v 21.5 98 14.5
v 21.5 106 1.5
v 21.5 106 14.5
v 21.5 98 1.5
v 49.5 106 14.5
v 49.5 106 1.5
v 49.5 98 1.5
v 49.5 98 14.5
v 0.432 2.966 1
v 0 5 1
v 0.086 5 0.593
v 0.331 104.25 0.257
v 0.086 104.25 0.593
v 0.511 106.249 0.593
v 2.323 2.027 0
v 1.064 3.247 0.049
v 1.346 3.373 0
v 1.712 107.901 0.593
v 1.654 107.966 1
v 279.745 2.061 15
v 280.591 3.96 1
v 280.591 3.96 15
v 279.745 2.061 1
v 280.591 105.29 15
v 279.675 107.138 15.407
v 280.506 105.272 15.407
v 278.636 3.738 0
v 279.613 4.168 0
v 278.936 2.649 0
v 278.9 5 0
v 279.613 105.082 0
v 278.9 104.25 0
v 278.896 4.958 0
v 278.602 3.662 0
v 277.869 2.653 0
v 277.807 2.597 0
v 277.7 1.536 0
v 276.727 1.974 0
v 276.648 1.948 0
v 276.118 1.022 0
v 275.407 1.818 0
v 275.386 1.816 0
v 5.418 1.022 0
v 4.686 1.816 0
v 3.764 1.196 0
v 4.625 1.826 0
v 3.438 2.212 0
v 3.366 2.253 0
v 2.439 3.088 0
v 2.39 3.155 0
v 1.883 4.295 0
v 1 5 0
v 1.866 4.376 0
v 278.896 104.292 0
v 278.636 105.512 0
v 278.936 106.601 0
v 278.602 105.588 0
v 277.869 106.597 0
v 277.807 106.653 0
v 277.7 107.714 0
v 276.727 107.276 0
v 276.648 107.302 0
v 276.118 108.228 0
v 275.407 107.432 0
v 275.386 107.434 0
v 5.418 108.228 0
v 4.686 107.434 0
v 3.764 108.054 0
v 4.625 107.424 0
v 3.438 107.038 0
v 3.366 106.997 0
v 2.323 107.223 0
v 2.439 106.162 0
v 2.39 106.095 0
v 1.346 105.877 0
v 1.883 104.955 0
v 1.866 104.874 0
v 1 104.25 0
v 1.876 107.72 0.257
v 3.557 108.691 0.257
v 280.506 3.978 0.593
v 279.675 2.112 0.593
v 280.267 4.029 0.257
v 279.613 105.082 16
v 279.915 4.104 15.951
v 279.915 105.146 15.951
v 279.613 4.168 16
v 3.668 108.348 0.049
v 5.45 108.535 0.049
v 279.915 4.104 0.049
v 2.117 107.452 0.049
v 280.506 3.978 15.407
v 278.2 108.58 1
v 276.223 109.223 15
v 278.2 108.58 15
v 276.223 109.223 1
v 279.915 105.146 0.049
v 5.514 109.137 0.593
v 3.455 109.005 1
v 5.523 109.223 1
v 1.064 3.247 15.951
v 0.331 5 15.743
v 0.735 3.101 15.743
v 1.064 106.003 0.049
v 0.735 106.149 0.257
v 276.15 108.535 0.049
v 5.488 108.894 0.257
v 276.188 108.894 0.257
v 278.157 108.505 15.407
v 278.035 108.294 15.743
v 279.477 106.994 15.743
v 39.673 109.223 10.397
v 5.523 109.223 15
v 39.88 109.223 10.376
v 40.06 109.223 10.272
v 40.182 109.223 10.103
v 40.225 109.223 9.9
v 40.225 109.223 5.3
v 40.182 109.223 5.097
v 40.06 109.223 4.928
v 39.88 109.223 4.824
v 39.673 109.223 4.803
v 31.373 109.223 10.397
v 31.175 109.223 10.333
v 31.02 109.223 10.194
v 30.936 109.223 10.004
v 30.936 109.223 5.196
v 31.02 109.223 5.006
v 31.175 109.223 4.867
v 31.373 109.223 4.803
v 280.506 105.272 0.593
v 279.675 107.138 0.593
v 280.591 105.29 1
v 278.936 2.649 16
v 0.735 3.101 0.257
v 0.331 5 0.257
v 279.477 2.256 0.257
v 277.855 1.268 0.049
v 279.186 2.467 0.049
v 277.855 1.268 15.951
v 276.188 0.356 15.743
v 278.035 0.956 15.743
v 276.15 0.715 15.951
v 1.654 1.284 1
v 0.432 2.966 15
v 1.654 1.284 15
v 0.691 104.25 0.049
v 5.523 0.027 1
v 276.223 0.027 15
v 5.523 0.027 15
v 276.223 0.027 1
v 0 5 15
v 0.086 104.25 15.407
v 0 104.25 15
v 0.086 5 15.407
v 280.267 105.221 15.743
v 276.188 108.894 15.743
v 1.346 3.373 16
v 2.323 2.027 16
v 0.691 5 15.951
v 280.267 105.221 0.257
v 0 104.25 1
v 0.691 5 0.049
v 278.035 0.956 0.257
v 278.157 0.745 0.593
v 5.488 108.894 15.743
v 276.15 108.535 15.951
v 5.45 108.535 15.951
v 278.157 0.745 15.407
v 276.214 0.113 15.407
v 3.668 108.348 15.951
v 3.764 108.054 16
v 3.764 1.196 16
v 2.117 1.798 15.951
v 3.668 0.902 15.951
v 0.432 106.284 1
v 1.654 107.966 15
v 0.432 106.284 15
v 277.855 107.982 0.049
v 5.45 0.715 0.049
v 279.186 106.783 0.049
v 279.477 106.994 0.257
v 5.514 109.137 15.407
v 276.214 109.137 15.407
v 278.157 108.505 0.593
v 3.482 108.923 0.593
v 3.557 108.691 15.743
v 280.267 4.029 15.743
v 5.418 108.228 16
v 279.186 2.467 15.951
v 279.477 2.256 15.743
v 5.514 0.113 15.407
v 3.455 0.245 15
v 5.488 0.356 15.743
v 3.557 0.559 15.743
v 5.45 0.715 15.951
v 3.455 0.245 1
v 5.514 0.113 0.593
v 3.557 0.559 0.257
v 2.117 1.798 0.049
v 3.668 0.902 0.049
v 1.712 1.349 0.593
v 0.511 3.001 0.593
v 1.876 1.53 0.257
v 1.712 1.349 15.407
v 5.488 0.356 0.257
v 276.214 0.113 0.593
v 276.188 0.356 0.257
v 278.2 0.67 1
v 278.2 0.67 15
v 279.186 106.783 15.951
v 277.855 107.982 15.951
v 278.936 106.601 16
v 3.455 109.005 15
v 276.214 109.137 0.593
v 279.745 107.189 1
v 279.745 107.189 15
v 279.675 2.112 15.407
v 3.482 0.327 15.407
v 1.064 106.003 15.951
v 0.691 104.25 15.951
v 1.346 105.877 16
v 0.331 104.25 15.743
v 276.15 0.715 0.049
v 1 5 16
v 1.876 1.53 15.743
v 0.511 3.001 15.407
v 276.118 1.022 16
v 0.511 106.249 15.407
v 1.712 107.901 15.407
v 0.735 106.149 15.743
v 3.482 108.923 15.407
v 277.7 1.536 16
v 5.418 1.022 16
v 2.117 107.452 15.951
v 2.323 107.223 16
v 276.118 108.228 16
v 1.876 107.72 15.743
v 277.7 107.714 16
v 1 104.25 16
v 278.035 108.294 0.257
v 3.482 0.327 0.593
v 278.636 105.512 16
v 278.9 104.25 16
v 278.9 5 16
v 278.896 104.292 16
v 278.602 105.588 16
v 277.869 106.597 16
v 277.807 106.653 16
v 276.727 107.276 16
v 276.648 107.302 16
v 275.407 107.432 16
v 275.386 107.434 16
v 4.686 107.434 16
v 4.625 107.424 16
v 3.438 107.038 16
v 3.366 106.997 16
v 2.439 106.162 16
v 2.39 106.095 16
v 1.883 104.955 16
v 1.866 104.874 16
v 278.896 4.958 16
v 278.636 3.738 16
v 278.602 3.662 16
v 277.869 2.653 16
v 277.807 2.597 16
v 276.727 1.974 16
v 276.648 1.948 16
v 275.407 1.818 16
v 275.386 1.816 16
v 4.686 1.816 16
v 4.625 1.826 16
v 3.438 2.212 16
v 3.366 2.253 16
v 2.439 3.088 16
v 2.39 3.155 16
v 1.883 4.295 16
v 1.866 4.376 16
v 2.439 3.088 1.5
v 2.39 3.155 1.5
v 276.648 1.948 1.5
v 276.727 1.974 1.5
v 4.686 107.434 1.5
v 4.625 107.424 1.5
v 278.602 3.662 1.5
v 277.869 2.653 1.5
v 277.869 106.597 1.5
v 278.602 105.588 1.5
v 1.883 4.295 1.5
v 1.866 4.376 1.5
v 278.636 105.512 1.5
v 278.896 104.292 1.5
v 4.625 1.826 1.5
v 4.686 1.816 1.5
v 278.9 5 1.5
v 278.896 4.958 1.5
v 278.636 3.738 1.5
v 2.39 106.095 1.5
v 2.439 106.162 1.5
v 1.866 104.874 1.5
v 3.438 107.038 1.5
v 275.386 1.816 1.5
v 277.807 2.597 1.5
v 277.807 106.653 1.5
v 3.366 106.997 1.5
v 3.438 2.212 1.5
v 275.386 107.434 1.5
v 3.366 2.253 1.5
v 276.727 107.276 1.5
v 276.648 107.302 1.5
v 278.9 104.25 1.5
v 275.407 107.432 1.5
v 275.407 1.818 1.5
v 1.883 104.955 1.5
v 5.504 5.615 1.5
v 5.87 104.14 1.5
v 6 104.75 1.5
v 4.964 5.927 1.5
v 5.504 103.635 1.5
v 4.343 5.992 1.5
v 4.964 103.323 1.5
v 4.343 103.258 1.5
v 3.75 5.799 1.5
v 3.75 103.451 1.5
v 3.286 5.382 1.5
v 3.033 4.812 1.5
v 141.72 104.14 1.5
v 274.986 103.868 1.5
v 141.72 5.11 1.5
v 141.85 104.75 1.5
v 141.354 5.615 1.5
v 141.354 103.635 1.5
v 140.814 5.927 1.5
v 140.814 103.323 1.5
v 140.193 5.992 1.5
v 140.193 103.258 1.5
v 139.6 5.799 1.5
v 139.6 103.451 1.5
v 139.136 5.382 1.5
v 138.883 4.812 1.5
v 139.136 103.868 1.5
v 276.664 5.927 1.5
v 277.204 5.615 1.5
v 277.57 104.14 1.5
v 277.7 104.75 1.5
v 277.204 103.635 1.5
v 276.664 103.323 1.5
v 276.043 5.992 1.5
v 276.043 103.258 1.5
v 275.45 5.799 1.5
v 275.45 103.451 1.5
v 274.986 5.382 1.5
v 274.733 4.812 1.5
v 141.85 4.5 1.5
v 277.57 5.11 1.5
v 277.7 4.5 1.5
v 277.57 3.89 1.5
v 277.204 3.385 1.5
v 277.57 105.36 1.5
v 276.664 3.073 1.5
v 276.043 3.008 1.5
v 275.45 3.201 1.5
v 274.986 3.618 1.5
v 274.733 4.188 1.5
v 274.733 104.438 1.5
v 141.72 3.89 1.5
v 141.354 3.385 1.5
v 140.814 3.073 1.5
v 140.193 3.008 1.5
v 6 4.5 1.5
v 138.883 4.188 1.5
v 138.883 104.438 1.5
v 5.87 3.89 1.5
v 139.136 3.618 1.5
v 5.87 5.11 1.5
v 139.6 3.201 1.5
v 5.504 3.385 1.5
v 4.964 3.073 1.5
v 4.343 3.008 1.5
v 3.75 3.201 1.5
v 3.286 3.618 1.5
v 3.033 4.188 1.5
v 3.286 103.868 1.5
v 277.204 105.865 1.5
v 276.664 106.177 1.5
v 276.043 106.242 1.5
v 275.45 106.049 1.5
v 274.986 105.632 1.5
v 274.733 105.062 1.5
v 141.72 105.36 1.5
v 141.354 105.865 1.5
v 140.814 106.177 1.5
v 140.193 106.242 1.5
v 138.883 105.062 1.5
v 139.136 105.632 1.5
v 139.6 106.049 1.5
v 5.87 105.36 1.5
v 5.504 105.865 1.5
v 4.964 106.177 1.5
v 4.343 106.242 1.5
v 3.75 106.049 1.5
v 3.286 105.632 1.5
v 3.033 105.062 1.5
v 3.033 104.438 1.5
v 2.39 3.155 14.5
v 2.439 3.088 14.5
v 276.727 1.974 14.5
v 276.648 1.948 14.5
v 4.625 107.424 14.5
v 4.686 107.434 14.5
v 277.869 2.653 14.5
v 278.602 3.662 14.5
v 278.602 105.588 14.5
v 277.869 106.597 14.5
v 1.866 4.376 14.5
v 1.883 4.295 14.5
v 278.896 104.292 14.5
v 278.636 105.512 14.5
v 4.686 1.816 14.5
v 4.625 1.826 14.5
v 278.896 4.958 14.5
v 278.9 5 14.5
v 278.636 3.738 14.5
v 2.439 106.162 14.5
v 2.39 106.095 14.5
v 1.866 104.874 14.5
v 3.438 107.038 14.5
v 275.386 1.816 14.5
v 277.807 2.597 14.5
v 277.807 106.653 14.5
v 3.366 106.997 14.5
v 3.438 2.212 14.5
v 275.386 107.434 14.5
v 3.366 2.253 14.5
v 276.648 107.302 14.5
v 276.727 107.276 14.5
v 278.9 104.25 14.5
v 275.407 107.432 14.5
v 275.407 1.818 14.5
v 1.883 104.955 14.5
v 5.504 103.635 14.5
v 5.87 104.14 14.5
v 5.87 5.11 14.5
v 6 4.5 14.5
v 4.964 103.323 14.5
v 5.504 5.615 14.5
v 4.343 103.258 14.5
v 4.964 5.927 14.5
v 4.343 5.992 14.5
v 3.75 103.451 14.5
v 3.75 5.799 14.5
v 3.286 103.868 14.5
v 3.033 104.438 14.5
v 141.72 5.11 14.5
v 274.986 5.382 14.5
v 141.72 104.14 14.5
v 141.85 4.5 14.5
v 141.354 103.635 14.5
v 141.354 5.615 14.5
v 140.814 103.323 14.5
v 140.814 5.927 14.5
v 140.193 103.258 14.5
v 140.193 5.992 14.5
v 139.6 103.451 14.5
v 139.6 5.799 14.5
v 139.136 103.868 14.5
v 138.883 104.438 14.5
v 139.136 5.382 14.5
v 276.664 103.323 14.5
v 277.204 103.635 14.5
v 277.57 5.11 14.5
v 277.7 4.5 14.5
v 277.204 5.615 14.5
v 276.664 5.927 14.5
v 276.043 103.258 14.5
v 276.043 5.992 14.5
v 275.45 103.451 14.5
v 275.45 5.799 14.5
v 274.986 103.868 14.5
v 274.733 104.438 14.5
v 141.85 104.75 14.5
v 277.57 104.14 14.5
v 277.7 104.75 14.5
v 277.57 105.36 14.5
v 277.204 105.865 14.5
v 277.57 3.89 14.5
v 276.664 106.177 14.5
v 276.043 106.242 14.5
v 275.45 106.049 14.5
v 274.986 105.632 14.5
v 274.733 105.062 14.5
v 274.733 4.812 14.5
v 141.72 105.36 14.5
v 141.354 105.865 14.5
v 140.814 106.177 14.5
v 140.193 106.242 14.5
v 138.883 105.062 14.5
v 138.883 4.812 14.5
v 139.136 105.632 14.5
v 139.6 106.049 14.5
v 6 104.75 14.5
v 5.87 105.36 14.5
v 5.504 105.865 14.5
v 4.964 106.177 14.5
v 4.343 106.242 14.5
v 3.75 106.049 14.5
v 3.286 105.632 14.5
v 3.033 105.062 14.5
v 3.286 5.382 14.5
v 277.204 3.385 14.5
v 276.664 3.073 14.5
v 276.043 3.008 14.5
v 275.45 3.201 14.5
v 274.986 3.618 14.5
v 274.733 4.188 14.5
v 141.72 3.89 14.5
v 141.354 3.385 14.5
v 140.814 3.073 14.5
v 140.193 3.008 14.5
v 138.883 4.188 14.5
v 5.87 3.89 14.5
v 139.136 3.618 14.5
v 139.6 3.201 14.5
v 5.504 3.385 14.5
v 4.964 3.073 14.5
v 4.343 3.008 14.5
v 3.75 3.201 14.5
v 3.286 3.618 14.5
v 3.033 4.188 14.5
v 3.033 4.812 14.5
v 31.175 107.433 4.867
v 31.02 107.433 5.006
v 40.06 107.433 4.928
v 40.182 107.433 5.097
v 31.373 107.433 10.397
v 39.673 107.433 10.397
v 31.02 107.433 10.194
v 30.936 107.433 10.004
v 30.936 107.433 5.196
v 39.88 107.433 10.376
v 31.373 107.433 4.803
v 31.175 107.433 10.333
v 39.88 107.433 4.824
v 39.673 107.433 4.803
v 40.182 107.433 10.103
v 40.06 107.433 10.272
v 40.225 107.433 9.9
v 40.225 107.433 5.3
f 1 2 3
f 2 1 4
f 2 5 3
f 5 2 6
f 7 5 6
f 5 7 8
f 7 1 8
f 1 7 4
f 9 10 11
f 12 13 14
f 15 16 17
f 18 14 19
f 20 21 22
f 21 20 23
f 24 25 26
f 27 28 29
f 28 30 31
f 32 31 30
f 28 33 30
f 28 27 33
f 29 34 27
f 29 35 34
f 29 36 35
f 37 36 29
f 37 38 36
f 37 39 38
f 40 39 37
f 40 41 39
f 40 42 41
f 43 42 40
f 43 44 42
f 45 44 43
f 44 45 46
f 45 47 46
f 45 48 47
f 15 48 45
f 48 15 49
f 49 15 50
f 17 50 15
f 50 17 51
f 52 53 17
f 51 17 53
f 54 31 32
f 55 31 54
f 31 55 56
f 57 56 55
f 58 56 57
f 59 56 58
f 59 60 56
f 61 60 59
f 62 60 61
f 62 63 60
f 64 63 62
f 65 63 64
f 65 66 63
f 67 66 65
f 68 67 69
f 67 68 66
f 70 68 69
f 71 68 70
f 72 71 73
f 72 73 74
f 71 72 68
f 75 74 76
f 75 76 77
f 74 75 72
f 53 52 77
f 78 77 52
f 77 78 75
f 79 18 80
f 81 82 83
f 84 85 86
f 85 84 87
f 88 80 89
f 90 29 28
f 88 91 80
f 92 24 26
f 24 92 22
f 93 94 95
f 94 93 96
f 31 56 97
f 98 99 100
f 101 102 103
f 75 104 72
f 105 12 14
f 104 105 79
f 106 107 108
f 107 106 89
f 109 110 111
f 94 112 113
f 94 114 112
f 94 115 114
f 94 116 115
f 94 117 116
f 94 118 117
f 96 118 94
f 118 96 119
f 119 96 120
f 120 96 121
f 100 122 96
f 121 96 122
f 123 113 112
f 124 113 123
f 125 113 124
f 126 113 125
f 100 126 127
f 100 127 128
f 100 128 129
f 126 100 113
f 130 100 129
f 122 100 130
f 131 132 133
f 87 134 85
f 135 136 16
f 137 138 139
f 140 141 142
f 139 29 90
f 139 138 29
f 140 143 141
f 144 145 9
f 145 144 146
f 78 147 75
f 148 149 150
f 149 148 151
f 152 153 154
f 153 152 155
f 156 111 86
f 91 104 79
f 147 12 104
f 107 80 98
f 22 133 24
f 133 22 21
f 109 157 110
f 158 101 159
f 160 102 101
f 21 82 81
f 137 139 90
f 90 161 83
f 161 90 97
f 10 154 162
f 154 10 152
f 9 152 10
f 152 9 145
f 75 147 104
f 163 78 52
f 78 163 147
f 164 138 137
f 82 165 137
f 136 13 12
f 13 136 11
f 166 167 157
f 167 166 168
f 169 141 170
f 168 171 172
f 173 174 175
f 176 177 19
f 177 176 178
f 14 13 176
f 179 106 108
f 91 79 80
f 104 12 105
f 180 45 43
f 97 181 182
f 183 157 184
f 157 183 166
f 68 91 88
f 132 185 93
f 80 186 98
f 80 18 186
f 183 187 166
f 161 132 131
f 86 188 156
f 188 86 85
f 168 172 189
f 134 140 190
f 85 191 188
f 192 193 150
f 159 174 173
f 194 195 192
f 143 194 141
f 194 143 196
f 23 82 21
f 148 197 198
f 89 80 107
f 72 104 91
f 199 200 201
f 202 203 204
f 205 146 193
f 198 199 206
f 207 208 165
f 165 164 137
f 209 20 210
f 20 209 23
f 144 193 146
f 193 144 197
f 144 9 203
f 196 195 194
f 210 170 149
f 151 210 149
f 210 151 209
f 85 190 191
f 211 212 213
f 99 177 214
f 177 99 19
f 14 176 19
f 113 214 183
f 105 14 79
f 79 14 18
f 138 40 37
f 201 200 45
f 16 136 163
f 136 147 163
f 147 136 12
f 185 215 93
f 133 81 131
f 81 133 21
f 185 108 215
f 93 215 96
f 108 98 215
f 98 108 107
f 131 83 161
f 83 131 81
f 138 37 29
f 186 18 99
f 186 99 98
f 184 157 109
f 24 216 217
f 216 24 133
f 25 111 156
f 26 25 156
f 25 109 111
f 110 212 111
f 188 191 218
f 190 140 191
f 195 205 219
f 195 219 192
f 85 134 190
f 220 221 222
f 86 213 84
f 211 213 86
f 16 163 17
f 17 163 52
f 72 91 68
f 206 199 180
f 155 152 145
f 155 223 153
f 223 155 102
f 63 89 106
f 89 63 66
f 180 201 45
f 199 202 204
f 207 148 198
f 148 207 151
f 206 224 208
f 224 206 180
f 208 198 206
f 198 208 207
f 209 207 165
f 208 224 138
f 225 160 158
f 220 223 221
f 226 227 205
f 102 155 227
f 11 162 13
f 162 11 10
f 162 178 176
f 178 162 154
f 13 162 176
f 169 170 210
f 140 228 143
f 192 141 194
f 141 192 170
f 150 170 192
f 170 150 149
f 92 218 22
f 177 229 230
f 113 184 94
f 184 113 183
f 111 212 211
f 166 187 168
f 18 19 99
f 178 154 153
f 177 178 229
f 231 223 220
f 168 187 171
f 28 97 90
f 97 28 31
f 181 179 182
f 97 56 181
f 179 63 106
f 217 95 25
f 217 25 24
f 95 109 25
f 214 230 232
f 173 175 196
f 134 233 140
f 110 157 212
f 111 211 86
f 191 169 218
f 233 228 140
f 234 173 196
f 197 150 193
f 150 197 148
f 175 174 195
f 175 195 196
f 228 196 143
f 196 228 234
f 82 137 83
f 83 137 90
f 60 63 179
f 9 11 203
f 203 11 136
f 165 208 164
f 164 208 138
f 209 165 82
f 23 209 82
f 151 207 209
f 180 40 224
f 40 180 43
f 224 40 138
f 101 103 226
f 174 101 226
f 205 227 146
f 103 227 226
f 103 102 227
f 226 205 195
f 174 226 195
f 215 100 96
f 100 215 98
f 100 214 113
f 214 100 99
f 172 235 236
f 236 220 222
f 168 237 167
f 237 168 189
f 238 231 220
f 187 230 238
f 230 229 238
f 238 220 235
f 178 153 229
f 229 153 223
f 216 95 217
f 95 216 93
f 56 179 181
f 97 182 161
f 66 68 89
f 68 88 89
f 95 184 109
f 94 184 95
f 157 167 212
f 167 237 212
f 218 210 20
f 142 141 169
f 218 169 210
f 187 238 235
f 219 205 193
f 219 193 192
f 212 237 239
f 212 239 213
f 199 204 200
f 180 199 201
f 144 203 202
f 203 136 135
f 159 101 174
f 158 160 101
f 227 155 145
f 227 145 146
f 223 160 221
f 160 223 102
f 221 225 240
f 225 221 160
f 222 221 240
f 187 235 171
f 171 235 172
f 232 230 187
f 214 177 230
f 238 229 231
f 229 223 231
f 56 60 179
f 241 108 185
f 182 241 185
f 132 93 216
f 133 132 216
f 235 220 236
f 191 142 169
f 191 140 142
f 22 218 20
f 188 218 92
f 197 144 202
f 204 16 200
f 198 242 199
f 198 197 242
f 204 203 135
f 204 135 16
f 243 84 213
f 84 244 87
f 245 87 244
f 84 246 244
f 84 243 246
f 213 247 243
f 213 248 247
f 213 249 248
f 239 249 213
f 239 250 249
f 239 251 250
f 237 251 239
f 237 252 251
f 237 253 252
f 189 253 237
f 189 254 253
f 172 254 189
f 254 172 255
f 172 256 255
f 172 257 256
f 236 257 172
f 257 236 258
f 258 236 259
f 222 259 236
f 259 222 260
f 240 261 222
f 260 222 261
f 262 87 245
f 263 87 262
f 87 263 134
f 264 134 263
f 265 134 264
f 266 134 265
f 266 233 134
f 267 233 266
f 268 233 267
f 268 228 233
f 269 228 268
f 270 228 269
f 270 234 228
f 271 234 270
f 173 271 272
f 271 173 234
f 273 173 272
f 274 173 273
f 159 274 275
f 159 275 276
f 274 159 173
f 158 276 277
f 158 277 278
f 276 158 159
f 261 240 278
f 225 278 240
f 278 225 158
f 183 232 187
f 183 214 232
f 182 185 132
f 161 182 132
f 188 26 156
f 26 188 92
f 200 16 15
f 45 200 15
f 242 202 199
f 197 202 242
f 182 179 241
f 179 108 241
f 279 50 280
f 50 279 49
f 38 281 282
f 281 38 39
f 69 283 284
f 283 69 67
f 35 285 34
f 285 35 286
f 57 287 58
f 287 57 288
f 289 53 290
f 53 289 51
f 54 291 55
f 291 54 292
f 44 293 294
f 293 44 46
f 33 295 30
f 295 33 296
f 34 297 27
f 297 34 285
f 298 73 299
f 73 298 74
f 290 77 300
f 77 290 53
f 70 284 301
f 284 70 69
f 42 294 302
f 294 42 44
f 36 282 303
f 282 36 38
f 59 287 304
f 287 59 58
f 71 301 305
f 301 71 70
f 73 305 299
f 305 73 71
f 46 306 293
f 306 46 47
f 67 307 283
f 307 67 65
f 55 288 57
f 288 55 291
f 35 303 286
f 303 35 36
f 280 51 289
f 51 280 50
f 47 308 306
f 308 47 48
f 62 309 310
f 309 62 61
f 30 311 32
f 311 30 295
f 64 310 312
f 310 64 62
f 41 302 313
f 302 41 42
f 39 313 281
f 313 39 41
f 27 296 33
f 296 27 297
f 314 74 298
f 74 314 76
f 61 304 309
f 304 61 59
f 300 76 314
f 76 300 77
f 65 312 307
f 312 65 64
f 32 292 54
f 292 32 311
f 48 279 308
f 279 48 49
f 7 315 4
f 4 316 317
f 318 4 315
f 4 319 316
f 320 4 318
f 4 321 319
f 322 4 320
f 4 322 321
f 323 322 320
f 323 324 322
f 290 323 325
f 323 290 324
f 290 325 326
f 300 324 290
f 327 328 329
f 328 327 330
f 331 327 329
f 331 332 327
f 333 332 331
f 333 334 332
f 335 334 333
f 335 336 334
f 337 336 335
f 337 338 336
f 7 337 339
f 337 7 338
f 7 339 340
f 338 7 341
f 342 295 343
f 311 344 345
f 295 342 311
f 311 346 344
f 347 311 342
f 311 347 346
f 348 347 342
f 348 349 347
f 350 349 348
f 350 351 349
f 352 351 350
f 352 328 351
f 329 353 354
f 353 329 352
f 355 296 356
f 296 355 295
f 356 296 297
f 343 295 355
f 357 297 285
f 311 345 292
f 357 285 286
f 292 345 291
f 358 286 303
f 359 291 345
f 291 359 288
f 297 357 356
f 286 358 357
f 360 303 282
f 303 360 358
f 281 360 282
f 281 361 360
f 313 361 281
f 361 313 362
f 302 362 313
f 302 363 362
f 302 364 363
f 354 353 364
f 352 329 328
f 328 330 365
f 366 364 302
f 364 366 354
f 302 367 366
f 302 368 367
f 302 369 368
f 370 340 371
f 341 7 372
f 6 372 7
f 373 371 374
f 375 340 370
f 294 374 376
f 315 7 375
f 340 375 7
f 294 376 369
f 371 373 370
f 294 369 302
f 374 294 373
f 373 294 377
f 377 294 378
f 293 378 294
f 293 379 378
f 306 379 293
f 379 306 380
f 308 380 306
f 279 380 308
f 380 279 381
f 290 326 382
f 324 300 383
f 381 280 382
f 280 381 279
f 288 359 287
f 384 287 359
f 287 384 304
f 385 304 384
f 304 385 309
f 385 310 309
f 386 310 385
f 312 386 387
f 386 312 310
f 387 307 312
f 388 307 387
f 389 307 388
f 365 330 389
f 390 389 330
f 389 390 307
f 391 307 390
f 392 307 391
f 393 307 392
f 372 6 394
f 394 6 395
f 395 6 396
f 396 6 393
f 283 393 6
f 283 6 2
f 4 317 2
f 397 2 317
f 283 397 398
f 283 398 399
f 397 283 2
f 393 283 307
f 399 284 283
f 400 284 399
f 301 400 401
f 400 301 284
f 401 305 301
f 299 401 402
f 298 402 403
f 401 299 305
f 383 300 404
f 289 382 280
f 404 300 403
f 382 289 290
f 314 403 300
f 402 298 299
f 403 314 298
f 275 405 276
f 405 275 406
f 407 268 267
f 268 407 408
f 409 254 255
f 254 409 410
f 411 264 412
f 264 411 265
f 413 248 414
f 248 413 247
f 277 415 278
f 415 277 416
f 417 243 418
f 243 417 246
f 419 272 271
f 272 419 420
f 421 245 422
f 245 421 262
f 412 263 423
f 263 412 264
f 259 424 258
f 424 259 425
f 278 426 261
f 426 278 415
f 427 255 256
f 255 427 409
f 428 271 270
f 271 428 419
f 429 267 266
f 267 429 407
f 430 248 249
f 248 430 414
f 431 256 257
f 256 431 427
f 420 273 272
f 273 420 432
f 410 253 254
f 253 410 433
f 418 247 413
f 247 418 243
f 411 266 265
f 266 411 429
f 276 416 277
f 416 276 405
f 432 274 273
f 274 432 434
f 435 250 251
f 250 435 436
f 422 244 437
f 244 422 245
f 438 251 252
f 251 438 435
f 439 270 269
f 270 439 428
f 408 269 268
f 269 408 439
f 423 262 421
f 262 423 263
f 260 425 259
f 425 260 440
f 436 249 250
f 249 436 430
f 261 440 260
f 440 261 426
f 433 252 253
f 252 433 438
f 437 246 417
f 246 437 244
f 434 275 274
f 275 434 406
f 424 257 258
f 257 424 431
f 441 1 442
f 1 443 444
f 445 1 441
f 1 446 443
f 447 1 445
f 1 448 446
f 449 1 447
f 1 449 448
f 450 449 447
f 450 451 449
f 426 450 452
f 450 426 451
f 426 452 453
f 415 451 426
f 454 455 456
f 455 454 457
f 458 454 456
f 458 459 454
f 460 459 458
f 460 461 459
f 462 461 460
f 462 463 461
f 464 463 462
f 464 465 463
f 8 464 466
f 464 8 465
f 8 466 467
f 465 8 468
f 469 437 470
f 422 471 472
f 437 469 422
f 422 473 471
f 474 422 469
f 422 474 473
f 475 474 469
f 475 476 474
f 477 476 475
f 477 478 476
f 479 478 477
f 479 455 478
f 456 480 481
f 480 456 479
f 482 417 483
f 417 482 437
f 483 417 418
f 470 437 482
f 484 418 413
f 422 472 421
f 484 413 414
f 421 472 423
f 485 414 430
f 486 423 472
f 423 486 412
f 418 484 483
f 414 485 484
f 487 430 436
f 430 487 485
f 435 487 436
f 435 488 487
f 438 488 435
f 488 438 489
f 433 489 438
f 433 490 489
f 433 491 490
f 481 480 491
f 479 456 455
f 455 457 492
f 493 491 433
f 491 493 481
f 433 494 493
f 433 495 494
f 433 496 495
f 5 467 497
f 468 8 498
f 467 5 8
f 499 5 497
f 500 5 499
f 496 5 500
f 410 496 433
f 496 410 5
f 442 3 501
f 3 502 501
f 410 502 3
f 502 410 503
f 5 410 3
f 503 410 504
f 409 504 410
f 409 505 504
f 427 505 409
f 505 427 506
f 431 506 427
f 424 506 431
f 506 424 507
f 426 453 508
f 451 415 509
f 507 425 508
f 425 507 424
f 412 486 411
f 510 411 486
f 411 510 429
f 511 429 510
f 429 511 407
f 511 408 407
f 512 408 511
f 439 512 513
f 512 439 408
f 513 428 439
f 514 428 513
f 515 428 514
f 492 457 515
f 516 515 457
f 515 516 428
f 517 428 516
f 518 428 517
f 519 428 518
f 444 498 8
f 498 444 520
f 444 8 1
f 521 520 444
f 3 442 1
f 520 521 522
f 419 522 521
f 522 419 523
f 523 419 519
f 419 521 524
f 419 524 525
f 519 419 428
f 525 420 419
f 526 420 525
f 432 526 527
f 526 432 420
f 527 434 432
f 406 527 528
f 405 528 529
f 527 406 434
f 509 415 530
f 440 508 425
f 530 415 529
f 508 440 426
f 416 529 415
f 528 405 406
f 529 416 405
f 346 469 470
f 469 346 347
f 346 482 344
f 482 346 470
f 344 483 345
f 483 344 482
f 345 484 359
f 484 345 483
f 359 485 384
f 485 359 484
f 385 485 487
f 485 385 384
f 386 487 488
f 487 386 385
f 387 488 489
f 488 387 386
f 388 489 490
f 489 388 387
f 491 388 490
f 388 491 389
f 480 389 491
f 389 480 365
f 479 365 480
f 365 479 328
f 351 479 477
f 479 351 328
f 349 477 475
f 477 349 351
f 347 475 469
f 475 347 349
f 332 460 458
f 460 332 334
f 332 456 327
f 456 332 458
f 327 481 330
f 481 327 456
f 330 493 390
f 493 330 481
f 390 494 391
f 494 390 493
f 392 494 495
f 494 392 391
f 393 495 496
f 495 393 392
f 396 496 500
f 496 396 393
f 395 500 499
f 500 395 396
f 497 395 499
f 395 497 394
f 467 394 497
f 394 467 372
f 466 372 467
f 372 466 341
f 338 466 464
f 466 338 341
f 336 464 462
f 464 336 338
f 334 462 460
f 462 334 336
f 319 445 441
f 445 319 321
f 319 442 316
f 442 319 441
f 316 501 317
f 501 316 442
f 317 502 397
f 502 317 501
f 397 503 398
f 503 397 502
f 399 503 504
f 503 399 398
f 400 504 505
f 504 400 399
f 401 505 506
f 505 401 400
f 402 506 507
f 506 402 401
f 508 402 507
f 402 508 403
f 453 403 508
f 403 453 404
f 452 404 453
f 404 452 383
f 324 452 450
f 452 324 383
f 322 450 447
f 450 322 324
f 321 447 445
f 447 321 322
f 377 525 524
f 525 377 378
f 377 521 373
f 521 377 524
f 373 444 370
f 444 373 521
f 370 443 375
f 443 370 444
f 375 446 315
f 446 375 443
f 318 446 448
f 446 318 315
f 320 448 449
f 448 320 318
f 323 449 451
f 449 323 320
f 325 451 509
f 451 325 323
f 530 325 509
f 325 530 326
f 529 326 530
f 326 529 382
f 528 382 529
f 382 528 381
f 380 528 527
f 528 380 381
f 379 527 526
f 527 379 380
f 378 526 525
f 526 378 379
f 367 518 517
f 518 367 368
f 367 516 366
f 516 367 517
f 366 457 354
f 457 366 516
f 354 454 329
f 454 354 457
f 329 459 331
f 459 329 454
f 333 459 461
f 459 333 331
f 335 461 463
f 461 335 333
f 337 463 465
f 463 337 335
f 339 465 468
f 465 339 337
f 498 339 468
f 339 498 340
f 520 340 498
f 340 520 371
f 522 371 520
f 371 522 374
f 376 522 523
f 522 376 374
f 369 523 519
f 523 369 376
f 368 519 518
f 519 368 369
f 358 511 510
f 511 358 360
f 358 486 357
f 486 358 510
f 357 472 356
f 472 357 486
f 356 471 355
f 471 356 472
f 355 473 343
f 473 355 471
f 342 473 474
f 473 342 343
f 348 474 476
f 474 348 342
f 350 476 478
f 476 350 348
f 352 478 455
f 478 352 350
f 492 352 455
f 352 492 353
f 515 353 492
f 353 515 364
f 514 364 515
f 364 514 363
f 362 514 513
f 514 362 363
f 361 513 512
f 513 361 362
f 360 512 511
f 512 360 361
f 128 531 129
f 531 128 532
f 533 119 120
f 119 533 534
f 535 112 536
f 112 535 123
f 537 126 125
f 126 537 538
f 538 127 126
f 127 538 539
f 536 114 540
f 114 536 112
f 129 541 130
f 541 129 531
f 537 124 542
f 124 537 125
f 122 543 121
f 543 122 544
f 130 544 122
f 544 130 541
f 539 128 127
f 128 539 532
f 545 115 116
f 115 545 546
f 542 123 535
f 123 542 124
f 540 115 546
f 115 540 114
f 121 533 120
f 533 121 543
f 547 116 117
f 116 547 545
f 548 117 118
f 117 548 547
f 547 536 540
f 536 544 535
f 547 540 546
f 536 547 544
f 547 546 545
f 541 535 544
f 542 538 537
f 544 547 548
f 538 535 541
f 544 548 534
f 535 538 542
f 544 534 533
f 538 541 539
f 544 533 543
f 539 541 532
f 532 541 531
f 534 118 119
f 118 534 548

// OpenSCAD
/* 
 * Keyboard midsection
 * Author: Anton Lazarev
 * https://gitlab.com/antonok/kb
 *
 * Units are in millimeters.
 */

/*
 * IMPORTANT:
 *
 * This model imports a DXF file of the PCB's outline.
 * This can be created as follows:
 *   - Open kb/pcb/kb-pcb.kicad_pcb in Kicad's Pcbnew editor
 *   - Select File > Plot
 *   - Make sure Edge.Cuts is the only selected layer
 *   - Uncheck "Plot all layers in outline (polygon) mode"
 *   - Ensure that "Plot Format" is set to DXF
 *   - Set "Output directory" to "../models/"
 *   - Check "Use auxiliary axis as origin"
 */

//Setting $fn to 400 creates very smooth curves, but takes a few
//minutes to render.
//Setting $fn to a lower value is recommended during development.
$fn=15;
HEIGHT=16;
CORNER_RADIUS=5;
BEVEL_RADIUS=1;

WIDTH=280.7;
DEPTH=109.25;

PLATE_XY_TOLERANCE=.2;

PLATE_HEIGHT=1.5;

HOLE_RECT_X=271.7;
HOLE_RECT_Y=100.25;
OUTER_BEVEL_RADIUS=3;
HOLE_RADIUS=1.5;
EDGE_OUTSET=2.5;

UPPER_LIP_WIDTH=1.8;

PORT_HEIGHT=5.6;
PORT_WIDTH=9.3;
PORT_BEVEL_RADIUS=0.5;

PORT_CENTER_TO_PCB_EDGE=29.718;
PORT_BOTTOM_DZ=4.8;
PCB_WIDTH=268.986;
PCB_HEIGHT=97.536;
PCB_INSET=(WIDTH-PCB_WIDTH)/2;
PCB_XY_TOLERANCE=1.1;

PORT_INSET_LEFT=21.5;
PORT_INSET_WIDTH=28;
PORT_INSET_FRONT=107.433;
PORT_INSET_SUPPORT_DEPTH=1.1615;
UPPER_PLATE_SUPPORT_HEIGHT=2;

//Reference variables
PLATE_X_DIM=HOLE_RECT_X+EDGE_OUTSET*2;
PLATE_Y_DIM=HOLE_RECT_Y+EDGE_OUTSET*2;

module CornerColumn() {
    translate([0,0,HEIGHT/2]) rotate_extrude() {
        hull() {
            translate([0,-HEIGHT/2]) square([CORNER_RADIUS-BEVEL_RADIUS,HEIGHT]);
            translate([CORNER_RADIUS-BEVEL_RADIUS,-(HEIGHT/2-BEVEL_RADIUS)]) circle(BEVEL_RADIUS);
            translate([CORNER_RADIUS-BEVEL_RADIUS,HEIGHT/2-BEVEL_RADIUS]) circle(BEVEL_RADIUS);
        }
    }
}

module SolidBody() {
    translate([CORNER_RADIUS,CORNER_RADIUS,0]) hull() {
        CornerColumn();
        translate([WIDTH-CORNER_RADIUS*2,0,0]) CornerColumn();
        translate([WIDTH-CORNER_RADIUS*2,DEPTH-CORNER_RADIUS*2,0]) CornerColumn();
        translate([0,DEPTH-CORNER_RADIUS*2,0]) CornerColumn();
    }
}

module PlateOutline(tolerance) {
    translate([EDGE_OUTSET+tolerance, EDGE_OUTSET+tolerance]) difference() {
        // Plate Outline
        offset(tolerance) hull() {
            translate([OUTER_BEVEL_RADIUS-EDGE_OUTSET,OUTER_BEVEL_RADIUS-EDGE_OUTSET]) circle(OUTER_BEVEL_RADIUS);
            translate([HOLE_RECT_X-OUTER_BEVEL_RADIUS+EDGE_OUTSET, OUTER_BEVEL_RADIUS-EDGE_OUTSET]) circle(OUTER_BEVEL_RADIUS);
            translate([HOLE_RECT_X-OUTER_BEVEL_RADIUS+EDGE_OUTSET, HOLE_RECT_Y-OUTER_BEVEL_RADIUS+EDGE_OUTSET]) circle(OUTER_BEVEL_RADIUS);
            translate([OUTER_BEVEL_RADIUS-EDGE_OUTSET,HOLE_RECT_Y-OUTER_BEVEL_RADIUS+EDGE_OUTSET]) circle(OUTER_BEVEL_RADIUS);
        }
    }
}

module ScrewHoles() {
    union() {
        circle(HOLE_RADIUS);
        translate([HOLE_RECT_X/2,0]) circle(HOLE_RADIUS);
        translate([HOLE_RECT_X,0]) circle(HOLE_RADIUS);
        translate([HOLE_RECT_X,HOLE_RECT_Y]) circle(HOLE_RADIUS);
        translate([HOLE_RECT_X/2,HOLE_RECT_Y]) circle(HOLE_RADIUS);
        translate([0,HOLE_RECT_Y]) circle(HOLE_RADIUS);
    }
}

module MiniUSBPort() {
    translate([PORT_BEVEL_RADIUS, PORT_BEVEL_RADIUS]) hull() {
        circle(PORT_BEVEL_RADIUS);
        translate([PORT_WIDTH-PORT_BEVEL_RADIUS*2,0]) circle(PORT_BEVEL_RADIUS);
        translate([PORT_WIDTH-PORT_BEVEL_RADIUS*2,PORT_HEIGHT-PORT_BEVEL_RADIUS*2]) circle(PORT_BEVEL_RADIUS);
        translate([0,PORT_HEIGHT-PORT_BEVEL_RADIUS*2]) circle(PORT_BEVEL_RADIUS);
    }
}

difference() {
    SolidBody();
    // Make room for plates in the top and bottom
    translate([UPPER_LIP_WIDTH, UPPER_LIP_WIDTH, 0]) linear_extrude(PLATE_HEIGHT) PlateOutline(PLATE_XY_TOLERANCE);
    translate([UPPER_LIP_WIDTH, UPPER_LIP_WIDTH, HEIGHT-PLATE_HEIGHT]) linear_extrude(PLATE_HEIGHT) PlateOutline(PLATE_XY_TOLERANCE);
    // Screw holes
    linear_extrude(HEIGHT) translate([UPPER_LIP_WIDTH+PLATE_XY_TOLERANCE+EDGE_OUTSET,UPPER_LIP_WIDTH+PLATE_XY_TOLERANCE+EDGE_OUTSET]) ScrewHoles();
    // Rebuild geometry near USB port area
    difference() {
        // PCB-shaped hole with tolerance
        union() {
            /* This line requires the PCB Edge.Cuts layer to be exported. */
            linear_extrude(HEIGHT) offset(r=PCB_XY_TOLERANCE) translate([PCB_INSET,PCB_INSET]) import(file = "../models/kb-pcb-Edge.Cuts.dxf");
            /* If you are getting an error here, please read the "IMPORTANT" section at the beginning of this file. */
            
            // Fill in the small hole within the boundaries of the the PCB
            linear_extrude(HEIGHT) translate([PORT_INSET_LEFT,98]) square([PORT_INSET_WIDTH,8]);
        }
        // Fill in the outer wall that was removed
        linear_extrude(HEIGHT) translate([PORT_INSET_LEFT,PORT_INSET_FRONT]) square([PORT_INSET_WIDTH,UPPER_LIP_WIDTH]);
        // Upper plate support
        translate([PORT_INSET_LEFT,PORT_INSET_FRONT-PORT_INSET_SUPPORT_DEPTH,HEIGHT-PLATE_HEIGHT-UPPER_PLATE_SUPPORT_HEIGHT])
            linear_extrude(UPPER_PLATE_SUPPORT_HEIGHT) square([PORT_INSET_WIDTH,UPPER_LIP_WIDTH]);
    }
    // Carve out USB port
    translate([PCB_INSET+PORT_CENTER_TO_PCB_EDGE-PORT_WIDTH/2,PORT_INSET_FRONT,PORT_BOTTOM_DZ])
        mirror([0,1,0]) rotate([90,0,0]) linear_extrude(EDGE_OUTSET) MiniUSBPort();
}
